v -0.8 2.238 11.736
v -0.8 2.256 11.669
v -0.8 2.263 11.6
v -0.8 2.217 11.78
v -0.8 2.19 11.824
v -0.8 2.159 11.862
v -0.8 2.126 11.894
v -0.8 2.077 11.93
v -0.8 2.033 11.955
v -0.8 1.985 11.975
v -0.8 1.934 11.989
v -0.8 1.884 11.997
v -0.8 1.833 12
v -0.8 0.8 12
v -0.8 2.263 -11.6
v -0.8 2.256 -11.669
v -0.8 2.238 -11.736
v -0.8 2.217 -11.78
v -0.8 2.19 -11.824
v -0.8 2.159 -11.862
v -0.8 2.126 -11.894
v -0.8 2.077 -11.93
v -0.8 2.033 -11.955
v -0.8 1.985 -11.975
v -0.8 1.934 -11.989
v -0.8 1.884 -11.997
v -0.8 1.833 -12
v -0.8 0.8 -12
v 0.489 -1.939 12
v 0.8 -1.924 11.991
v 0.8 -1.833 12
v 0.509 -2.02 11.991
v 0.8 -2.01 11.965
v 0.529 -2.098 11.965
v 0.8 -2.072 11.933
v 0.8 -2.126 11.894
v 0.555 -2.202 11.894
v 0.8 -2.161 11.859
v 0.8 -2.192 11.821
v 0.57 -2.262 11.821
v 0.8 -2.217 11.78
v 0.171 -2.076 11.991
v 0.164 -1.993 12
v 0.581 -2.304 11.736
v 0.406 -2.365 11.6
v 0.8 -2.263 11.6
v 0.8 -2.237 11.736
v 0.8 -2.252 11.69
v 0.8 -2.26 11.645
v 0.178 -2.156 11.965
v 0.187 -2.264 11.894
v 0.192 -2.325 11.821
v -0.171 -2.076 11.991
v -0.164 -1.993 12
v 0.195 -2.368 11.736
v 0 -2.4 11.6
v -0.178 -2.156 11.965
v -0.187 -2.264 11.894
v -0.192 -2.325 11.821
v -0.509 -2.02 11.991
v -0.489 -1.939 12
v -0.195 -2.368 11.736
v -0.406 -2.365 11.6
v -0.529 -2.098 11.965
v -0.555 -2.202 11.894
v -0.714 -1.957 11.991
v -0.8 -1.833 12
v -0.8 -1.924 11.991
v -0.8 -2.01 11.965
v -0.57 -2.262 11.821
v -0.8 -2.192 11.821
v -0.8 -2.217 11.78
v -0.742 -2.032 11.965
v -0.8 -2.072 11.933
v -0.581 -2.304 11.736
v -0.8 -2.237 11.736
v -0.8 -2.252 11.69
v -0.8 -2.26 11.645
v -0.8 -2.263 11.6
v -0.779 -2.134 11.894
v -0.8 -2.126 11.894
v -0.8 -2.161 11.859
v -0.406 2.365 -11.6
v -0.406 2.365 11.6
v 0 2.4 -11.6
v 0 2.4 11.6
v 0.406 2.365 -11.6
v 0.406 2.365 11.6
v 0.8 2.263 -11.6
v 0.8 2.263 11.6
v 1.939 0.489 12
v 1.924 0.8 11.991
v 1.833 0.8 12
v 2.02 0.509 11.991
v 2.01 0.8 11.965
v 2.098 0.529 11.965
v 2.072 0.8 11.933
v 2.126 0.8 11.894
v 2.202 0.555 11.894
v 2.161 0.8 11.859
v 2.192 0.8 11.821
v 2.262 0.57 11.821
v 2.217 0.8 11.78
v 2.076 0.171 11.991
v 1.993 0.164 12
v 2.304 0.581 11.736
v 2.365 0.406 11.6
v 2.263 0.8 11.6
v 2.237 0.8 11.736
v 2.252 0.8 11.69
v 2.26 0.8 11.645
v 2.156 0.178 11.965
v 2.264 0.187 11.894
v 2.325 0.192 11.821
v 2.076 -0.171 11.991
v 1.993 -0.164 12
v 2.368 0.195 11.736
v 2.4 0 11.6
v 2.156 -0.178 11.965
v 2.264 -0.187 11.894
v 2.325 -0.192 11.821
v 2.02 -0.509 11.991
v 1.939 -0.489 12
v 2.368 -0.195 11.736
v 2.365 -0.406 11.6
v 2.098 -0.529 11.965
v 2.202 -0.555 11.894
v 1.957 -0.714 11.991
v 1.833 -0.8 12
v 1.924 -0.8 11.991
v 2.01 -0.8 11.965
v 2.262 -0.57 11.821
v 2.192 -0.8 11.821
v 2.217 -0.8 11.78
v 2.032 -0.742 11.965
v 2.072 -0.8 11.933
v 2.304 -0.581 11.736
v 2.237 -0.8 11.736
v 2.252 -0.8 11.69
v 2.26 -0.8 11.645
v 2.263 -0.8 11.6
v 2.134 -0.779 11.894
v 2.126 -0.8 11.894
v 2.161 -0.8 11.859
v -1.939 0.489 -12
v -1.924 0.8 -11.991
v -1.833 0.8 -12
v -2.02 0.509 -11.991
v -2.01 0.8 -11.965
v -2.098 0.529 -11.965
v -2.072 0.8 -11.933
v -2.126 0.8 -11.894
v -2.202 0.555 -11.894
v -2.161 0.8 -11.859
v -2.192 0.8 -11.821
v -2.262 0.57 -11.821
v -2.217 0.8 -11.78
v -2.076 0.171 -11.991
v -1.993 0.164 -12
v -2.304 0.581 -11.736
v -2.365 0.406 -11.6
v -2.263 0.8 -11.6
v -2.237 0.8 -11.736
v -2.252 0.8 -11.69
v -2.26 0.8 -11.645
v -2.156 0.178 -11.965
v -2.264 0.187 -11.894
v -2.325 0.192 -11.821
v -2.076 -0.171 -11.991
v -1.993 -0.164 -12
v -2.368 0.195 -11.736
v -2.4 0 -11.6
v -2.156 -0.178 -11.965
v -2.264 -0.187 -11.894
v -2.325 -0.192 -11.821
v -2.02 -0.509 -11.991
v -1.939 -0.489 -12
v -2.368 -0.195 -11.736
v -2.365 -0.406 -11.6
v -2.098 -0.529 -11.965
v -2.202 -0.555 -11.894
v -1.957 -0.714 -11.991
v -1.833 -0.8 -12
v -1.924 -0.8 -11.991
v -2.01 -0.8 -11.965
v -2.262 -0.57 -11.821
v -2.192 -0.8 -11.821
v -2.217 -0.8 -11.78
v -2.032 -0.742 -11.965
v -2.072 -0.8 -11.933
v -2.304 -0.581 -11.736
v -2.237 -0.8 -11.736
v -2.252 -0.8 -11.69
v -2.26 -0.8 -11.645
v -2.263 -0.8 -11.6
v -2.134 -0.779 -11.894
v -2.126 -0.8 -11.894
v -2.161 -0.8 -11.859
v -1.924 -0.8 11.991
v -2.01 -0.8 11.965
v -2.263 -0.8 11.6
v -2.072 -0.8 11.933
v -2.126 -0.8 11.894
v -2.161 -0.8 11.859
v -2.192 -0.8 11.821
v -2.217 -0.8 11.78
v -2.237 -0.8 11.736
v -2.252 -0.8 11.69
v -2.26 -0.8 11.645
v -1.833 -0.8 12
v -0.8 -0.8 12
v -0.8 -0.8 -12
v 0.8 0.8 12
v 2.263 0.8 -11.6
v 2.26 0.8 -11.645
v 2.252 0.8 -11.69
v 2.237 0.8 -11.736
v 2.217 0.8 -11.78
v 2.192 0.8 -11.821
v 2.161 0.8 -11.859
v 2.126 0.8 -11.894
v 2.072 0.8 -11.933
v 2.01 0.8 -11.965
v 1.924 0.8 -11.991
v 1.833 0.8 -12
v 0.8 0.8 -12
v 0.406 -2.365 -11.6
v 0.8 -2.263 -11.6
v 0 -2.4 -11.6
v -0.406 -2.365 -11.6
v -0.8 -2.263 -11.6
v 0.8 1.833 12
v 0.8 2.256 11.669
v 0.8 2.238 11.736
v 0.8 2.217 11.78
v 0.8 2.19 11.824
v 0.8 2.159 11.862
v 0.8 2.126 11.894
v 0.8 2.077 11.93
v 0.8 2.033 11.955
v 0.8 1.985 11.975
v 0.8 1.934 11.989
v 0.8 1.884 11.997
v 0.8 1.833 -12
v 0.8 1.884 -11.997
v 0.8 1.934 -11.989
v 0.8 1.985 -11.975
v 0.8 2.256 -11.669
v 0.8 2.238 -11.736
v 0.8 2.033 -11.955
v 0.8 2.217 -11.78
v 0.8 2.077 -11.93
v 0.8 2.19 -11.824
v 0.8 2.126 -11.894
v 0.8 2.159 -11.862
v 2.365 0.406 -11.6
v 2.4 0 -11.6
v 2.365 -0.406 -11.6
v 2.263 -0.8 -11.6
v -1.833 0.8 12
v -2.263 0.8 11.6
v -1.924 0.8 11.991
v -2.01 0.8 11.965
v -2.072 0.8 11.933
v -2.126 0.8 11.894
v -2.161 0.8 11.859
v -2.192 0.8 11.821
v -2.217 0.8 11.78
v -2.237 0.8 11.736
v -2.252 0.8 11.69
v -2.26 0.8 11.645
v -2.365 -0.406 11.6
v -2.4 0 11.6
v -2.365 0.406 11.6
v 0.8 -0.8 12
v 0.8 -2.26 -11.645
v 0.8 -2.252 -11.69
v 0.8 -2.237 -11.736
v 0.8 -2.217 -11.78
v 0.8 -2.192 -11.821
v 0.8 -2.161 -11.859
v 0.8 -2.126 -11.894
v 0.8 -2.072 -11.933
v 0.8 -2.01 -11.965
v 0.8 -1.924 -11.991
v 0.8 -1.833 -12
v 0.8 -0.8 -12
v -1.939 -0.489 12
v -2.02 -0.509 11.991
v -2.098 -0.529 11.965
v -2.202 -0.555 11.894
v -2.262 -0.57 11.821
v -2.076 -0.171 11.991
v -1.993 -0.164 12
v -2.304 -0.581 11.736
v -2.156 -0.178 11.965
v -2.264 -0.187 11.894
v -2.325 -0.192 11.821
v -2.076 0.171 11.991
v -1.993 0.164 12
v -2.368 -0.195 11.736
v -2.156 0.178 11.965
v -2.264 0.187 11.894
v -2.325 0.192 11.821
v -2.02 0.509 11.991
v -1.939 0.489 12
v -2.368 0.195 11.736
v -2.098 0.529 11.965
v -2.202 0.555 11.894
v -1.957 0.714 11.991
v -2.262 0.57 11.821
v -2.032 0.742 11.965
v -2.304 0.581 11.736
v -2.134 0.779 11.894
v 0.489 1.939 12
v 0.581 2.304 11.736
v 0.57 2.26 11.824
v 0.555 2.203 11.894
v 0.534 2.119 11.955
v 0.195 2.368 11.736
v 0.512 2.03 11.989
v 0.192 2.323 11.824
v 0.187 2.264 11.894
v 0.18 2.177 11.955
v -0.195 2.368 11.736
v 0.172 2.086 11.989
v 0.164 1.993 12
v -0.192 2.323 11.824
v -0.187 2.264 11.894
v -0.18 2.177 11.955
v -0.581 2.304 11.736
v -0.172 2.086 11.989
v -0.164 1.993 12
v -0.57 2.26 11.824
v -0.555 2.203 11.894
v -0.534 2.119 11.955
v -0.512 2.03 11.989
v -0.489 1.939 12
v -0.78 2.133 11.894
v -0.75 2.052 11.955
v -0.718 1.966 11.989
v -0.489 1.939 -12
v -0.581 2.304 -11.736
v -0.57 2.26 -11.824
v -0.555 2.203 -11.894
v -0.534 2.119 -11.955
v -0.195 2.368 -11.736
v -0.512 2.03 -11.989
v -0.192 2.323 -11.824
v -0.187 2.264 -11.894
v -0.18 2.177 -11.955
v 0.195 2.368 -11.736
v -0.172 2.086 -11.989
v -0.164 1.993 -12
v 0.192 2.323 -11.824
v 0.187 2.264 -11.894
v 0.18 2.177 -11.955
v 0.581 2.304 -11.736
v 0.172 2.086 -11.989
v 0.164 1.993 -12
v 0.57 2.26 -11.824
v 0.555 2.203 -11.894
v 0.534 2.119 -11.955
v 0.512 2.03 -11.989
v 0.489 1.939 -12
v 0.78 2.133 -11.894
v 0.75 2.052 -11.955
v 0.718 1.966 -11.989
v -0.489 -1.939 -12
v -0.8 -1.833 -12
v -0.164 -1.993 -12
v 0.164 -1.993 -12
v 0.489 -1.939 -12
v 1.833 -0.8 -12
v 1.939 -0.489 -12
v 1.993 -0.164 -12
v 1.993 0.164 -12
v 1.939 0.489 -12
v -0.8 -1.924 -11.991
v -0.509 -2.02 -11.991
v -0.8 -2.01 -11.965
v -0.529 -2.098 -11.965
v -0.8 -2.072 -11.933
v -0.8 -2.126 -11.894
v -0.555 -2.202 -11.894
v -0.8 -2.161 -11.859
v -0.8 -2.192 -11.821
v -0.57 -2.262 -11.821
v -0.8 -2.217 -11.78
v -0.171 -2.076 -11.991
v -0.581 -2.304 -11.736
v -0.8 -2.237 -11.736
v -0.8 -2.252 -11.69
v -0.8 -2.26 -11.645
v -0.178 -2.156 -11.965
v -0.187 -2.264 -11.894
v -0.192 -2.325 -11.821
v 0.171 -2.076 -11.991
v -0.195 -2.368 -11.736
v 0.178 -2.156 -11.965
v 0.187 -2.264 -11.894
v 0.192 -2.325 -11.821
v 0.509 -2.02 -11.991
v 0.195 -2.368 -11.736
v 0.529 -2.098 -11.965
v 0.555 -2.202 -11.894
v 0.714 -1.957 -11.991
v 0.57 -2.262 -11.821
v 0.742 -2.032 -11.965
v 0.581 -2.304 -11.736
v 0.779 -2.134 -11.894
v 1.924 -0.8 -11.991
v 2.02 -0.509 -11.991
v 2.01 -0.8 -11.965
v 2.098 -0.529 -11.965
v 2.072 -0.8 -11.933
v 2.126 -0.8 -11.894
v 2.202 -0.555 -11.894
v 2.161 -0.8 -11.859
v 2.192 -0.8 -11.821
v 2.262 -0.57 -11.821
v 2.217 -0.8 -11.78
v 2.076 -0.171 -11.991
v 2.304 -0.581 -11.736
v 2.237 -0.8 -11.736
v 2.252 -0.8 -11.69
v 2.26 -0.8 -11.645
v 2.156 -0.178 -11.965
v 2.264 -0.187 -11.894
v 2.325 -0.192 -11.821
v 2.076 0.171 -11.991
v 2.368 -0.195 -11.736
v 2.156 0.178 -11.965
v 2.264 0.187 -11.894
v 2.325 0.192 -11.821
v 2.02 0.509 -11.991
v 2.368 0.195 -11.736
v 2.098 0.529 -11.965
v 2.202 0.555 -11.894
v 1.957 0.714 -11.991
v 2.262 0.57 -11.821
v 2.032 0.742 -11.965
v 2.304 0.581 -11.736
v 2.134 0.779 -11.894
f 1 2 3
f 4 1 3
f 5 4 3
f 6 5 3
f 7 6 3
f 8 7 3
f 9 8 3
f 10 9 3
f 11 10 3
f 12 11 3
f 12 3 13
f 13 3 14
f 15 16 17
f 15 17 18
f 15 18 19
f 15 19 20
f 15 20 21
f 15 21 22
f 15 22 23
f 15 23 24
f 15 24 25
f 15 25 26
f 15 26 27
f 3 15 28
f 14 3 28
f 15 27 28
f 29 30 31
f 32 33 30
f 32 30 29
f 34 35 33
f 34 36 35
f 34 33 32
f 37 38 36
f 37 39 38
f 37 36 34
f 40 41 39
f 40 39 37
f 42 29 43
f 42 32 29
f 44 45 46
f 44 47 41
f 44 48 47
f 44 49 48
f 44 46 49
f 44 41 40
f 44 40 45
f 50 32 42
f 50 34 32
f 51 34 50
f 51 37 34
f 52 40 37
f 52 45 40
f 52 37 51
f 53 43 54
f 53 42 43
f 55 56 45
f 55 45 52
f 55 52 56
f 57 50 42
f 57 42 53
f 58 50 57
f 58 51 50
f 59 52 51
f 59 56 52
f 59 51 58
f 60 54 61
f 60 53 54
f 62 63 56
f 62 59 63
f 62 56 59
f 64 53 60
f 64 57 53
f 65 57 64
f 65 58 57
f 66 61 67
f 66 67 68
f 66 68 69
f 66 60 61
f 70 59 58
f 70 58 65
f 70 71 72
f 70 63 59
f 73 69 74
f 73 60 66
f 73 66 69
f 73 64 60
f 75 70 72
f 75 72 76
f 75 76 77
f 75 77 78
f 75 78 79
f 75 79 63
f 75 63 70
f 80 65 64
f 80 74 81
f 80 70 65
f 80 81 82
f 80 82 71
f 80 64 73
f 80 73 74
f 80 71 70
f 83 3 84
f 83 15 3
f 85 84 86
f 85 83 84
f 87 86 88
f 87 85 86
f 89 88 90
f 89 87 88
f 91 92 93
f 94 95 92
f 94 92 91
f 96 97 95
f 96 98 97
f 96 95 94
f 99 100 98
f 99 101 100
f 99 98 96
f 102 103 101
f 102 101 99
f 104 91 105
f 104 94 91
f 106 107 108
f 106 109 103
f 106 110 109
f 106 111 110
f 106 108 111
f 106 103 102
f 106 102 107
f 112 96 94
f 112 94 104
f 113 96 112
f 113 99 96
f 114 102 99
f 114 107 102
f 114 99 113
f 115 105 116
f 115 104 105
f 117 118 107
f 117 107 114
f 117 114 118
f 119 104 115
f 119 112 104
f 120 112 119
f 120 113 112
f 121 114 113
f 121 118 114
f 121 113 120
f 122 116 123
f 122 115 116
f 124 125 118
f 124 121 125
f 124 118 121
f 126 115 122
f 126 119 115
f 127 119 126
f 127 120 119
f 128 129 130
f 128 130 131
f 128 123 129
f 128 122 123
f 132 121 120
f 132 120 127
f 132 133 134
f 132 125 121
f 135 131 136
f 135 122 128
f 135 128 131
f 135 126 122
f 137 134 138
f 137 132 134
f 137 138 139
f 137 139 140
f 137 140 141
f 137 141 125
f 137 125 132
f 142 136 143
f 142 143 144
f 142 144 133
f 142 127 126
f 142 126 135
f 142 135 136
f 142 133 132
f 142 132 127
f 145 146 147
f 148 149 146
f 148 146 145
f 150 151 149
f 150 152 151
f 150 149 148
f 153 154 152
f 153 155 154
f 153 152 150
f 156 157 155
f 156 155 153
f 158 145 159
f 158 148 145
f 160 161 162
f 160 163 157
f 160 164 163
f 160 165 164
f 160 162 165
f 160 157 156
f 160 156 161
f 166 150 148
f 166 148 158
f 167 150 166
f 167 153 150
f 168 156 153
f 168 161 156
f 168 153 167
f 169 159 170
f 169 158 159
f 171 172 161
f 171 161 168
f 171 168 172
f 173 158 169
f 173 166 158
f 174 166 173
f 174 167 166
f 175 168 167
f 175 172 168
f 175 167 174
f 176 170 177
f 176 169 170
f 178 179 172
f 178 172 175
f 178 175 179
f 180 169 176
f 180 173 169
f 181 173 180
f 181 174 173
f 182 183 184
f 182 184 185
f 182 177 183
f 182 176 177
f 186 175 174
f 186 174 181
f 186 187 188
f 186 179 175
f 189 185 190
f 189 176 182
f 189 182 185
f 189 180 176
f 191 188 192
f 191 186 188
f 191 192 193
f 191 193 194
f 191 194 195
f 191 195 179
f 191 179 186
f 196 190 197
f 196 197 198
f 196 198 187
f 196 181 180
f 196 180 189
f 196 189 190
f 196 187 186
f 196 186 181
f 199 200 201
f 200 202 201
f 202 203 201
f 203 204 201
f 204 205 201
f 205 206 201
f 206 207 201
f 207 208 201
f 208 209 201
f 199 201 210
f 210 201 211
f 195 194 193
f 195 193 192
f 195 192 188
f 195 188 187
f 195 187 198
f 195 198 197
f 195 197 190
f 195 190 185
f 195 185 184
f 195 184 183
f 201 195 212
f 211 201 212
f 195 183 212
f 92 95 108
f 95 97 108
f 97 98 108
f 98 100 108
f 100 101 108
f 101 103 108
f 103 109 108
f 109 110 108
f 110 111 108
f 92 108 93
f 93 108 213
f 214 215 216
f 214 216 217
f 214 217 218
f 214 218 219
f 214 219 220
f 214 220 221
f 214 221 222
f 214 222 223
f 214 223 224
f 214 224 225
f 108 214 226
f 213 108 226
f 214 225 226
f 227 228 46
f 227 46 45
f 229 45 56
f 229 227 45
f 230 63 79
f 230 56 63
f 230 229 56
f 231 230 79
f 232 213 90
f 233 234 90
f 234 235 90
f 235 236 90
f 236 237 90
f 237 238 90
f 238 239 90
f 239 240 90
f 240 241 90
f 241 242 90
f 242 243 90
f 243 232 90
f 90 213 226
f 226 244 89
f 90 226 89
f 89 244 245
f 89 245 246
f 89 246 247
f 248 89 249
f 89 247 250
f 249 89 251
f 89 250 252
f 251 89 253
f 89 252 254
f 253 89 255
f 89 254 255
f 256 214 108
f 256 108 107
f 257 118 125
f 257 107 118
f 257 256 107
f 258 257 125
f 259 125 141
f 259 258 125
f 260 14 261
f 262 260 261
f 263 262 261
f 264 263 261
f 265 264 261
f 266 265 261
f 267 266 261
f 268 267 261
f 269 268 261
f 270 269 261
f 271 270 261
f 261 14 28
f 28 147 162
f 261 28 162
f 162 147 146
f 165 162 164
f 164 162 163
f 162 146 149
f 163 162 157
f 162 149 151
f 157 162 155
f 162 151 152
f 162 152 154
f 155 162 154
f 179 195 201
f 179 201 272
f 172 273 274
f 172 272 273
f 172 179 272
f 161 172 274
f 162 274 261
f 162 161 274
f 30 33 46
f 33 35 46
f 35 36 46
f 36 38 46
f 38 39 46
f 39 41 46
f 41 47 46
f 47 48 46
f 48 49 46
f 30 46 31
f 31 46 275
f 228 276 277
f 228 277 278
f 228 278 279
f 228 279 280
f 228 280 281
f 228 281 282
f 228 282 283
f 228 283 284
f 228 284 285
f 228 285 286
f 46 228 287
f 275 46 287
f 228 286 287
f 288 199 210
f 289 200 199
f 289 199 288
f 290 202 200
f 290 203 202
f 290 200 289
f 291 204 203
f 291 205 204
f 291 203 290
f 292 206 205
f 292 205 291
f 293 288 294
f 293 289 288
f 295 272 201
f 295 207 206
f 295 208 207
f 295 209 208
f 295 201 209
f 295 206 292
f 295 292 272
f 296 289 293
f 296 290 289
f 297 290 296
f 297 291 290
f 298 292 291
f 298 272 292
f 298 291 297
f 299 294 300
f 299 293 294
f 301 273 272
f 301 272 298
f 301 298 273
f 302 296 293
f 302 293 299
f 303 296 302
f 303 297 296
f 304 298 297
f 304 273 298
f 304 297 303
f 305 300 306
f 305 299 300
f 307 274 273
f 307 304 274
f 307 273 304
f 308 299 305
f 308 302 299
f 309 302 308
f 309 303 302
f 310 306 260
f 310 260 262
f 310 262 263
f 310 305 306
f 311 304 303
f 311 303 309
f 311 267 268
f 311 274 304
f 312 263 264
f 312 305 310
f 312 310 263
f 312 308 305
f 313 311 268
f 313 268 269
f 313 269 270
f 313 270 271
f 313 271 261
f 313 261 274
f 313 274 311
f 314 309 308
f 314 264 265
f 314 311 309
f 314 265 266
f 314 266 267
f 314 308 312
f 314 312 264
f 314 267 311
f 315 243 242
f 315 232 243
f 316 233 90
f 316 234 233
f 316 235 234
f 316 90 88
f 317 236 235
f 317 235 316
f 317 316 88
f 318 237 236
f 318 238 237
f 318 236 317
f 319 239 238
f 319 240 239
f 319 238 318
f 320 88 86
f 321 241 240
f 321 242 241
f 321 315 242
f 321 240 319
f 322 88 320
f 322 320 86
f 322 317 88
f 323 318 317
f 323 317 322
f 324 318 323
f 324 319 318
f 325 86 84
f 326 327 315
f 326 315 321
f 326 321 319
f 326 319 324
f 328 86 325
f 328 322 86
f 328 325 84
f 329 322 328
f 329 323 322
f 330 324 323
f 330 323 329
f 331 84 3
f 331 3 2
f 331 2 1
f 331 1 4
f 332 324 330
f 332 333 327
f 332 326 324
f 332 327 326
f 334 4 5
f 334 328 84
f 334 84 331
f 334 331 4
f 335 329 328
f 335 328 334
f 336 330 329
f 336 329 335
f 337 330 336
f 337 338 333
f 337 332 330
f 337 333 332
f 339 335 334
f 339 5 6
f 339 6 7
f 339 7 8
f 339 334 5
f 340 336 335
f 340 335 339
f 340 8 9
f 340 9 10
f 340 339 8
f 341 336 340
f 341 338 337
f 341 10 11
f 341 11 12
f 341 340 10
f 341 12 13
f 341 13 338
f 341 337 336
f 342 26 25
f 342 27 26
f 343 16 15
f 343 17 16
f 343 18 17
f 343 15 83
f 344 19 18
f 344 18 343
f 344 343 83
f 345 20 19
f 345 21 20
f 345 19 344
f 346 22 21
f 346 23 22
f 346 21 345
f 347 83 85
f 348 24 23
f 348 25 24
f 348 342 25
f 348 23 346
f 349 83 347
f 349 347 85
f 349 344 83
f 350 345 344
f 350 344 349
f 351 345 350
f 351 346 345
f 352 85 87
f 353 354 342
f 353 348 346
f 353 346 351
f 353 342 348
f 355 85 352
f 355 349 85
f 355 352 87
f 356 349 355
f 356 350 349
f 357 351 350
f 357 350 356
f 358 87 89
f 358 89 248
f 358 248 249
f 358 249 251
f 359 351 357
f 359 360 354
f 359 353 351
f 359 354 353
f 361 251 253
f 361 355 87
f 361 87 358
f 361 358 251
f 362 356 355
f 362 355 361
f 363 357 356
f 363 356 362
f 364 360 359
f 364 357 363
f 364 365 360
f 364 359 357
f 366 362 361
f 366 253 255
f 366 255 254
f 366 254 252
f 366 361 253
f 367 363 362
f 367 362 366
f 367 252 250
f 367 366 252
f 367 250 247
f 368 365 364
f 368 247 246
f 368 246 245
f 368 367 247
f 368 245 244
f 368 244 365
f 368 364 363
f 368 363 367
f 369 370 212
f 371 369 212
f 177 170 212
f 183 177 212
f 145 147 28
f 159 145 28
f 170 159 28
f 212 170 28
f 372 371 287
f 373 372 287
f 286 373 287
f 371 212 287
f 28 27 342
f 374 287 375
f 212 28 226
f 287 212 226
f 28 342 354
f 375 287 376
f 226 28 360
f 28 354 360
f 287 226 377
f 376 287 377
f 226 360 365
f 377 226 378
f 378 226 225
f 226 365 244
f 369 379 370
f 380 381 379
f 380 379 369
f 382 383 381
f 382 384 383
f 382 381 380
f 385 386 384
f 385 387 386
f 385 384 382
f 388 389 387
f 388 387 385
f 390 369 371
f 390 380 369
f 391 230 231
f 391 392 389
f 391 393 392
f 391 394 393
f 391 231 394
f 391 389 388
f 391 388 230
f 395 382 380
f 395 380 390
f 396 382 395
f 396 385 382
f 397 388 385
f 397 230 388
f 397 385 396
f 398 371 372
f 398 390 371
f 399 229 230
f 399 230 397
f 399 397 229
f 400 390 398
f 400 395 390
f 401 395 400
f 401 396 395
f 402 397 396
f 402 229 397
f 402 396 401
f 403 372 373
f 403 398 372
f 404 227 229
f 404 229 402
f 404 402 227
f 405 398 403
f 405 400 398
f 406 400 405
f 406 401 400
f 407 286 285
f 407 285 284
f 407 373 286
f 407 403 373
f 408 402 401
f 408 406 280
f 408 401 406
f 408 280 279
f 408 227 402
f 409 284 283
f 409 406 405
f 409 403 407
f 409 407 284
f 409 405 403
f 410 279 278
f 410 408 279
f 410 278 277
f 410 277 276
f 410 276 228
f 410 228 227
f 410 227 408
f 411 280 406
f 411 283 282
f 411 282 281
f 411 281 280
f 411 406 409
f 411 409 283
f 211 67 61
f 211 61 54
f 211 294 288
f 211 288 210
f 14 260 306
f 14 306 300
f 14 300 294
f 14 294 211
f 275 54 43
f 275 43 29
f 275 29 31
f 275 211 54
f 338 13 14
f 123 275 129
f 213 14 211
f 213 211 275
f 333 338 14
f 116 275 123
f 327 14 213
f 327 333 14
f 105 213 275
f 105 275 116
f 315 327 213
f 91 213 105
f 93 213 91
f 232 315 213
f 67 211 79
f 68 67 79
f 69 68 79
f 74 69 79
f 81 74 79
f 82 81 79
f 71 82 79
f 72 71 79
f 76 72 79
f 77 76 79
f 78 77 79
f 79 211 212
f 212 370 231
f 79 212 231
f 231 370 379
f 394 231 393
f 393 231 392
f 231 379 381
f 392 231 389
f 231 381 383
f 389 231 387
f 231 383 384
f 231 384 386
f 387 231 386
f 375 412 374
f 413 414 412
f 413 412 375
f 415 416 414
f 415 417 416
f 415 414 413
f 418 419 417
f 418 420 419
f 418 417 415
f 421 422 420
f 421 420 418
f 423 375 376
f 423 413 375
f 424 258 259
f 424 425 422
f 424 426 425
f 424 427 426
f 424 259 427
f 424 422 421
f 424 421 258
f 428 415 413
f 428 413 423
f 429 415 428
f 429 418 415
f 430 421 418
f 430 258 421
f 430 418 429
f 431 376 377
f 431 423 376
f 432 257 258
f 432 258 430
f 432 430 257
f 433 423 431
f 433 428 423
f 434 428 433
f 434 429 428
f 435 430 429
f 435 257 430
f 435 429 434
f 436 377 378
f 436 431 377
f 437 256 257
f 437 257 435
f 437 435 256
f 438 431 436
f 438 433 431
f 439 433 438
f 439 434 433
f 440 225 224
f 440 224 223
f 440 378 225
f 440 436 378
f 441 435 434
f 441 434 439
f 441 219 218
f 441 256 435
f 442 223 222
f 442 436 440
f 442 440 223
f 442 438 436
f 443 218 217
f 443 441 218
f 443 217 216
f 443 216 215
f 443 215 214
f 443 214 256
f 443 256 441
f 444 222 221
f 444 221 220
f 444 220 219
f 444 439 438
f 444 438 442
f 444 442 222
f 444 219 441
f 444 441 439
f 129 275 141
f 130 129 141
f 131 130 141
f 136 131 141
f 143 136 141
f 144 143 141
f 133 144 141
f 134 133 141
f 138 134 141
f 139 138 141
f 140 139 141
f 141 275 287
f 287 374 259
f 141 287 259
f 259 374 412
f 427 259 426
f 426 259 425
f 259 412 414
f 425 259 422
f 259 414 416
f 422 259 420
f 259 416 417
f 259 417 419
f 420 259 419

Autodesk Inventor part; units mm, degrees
ref_plane "YZ Plane" through (0, 0, 0) normal (1, 0, 0) x (0, 1, 0)
ref_plane "XZ Plane" through (0, 0, 0) normal (0, 1, 0) x (-1, 0, 0)
ref_plane "XY Plane" through (0, 0, 0) normal (0, 0, 1) x (1, 0, 0)
sketch "Sketch1" plane through (0, 0, 0) normal (0, 0, 1) x (1, 0, 0)
  circle A0 centre (0, 0) radius 2.4 construction
  line L0 (-0.8, 2.2627) -> (-0.8, 0.8)
  line L1 (-0.8, 0.8) -> (-2.2627, 0.8)
  line L2 (-2.2627, -0.8) -> (-0.8, -0.8)
  line L3 (-0.8, -0.8) -> (-0.8, -2.2627)
  line L4 (0.8, -2.2627) -> (0.8, -0.8)
  line L5 (0.8, -0.8) -> (2.2627, -0.8)
  line L6 (2.2627, 0.8) -> (0.8, 0.8)
  line L7 (0.8, 0.8) -> (0.8, 2.2627)
  arc A1 (0.8, 2.2627) -> (-0.8, 2.2627) centre (0, 0) ccw
  arc A2 (-2.2627, 0.8) -> (-2.2627, -0.8) centre (0, 0) ccw
  arc A3 (-0.8, -2.2627) -> (0.8, -2.2627) centre (0, 0) ccw
  arc A4 (2.2627, -0.8) -> (2.2627, 0.8) centre (0, 0) ccw
  dimension "d0" = 4.8
  dimension "d1" = 1.6
extrude "Extrusion1" add sketch "Sketch1" along normal mid plane 24
fillet "Fillet1" radius 0.4 8 edges at (0, 2.4, 12) (-2.4, 0, 12) (0, -2.4, 12) (2.4, 0, 12) (2.4, 0, -12) (0, 2.4, -12) (-2.4, 0, -12) (0, -2.4, -12)
equation "\"d0\" = kd"
equation "\"d1\" = axlet"
equation "\"d2\" = 3 * lu"
equation "\"d4\" = tf"
equation "\"kd\" = 4.8"
equation "\"axlet\" = 1.6"
equation "\"lu\" = 8"
equation "\"tf\" = 0.4"
properties part number "4519-Yellow" material "ABS Plastic"
